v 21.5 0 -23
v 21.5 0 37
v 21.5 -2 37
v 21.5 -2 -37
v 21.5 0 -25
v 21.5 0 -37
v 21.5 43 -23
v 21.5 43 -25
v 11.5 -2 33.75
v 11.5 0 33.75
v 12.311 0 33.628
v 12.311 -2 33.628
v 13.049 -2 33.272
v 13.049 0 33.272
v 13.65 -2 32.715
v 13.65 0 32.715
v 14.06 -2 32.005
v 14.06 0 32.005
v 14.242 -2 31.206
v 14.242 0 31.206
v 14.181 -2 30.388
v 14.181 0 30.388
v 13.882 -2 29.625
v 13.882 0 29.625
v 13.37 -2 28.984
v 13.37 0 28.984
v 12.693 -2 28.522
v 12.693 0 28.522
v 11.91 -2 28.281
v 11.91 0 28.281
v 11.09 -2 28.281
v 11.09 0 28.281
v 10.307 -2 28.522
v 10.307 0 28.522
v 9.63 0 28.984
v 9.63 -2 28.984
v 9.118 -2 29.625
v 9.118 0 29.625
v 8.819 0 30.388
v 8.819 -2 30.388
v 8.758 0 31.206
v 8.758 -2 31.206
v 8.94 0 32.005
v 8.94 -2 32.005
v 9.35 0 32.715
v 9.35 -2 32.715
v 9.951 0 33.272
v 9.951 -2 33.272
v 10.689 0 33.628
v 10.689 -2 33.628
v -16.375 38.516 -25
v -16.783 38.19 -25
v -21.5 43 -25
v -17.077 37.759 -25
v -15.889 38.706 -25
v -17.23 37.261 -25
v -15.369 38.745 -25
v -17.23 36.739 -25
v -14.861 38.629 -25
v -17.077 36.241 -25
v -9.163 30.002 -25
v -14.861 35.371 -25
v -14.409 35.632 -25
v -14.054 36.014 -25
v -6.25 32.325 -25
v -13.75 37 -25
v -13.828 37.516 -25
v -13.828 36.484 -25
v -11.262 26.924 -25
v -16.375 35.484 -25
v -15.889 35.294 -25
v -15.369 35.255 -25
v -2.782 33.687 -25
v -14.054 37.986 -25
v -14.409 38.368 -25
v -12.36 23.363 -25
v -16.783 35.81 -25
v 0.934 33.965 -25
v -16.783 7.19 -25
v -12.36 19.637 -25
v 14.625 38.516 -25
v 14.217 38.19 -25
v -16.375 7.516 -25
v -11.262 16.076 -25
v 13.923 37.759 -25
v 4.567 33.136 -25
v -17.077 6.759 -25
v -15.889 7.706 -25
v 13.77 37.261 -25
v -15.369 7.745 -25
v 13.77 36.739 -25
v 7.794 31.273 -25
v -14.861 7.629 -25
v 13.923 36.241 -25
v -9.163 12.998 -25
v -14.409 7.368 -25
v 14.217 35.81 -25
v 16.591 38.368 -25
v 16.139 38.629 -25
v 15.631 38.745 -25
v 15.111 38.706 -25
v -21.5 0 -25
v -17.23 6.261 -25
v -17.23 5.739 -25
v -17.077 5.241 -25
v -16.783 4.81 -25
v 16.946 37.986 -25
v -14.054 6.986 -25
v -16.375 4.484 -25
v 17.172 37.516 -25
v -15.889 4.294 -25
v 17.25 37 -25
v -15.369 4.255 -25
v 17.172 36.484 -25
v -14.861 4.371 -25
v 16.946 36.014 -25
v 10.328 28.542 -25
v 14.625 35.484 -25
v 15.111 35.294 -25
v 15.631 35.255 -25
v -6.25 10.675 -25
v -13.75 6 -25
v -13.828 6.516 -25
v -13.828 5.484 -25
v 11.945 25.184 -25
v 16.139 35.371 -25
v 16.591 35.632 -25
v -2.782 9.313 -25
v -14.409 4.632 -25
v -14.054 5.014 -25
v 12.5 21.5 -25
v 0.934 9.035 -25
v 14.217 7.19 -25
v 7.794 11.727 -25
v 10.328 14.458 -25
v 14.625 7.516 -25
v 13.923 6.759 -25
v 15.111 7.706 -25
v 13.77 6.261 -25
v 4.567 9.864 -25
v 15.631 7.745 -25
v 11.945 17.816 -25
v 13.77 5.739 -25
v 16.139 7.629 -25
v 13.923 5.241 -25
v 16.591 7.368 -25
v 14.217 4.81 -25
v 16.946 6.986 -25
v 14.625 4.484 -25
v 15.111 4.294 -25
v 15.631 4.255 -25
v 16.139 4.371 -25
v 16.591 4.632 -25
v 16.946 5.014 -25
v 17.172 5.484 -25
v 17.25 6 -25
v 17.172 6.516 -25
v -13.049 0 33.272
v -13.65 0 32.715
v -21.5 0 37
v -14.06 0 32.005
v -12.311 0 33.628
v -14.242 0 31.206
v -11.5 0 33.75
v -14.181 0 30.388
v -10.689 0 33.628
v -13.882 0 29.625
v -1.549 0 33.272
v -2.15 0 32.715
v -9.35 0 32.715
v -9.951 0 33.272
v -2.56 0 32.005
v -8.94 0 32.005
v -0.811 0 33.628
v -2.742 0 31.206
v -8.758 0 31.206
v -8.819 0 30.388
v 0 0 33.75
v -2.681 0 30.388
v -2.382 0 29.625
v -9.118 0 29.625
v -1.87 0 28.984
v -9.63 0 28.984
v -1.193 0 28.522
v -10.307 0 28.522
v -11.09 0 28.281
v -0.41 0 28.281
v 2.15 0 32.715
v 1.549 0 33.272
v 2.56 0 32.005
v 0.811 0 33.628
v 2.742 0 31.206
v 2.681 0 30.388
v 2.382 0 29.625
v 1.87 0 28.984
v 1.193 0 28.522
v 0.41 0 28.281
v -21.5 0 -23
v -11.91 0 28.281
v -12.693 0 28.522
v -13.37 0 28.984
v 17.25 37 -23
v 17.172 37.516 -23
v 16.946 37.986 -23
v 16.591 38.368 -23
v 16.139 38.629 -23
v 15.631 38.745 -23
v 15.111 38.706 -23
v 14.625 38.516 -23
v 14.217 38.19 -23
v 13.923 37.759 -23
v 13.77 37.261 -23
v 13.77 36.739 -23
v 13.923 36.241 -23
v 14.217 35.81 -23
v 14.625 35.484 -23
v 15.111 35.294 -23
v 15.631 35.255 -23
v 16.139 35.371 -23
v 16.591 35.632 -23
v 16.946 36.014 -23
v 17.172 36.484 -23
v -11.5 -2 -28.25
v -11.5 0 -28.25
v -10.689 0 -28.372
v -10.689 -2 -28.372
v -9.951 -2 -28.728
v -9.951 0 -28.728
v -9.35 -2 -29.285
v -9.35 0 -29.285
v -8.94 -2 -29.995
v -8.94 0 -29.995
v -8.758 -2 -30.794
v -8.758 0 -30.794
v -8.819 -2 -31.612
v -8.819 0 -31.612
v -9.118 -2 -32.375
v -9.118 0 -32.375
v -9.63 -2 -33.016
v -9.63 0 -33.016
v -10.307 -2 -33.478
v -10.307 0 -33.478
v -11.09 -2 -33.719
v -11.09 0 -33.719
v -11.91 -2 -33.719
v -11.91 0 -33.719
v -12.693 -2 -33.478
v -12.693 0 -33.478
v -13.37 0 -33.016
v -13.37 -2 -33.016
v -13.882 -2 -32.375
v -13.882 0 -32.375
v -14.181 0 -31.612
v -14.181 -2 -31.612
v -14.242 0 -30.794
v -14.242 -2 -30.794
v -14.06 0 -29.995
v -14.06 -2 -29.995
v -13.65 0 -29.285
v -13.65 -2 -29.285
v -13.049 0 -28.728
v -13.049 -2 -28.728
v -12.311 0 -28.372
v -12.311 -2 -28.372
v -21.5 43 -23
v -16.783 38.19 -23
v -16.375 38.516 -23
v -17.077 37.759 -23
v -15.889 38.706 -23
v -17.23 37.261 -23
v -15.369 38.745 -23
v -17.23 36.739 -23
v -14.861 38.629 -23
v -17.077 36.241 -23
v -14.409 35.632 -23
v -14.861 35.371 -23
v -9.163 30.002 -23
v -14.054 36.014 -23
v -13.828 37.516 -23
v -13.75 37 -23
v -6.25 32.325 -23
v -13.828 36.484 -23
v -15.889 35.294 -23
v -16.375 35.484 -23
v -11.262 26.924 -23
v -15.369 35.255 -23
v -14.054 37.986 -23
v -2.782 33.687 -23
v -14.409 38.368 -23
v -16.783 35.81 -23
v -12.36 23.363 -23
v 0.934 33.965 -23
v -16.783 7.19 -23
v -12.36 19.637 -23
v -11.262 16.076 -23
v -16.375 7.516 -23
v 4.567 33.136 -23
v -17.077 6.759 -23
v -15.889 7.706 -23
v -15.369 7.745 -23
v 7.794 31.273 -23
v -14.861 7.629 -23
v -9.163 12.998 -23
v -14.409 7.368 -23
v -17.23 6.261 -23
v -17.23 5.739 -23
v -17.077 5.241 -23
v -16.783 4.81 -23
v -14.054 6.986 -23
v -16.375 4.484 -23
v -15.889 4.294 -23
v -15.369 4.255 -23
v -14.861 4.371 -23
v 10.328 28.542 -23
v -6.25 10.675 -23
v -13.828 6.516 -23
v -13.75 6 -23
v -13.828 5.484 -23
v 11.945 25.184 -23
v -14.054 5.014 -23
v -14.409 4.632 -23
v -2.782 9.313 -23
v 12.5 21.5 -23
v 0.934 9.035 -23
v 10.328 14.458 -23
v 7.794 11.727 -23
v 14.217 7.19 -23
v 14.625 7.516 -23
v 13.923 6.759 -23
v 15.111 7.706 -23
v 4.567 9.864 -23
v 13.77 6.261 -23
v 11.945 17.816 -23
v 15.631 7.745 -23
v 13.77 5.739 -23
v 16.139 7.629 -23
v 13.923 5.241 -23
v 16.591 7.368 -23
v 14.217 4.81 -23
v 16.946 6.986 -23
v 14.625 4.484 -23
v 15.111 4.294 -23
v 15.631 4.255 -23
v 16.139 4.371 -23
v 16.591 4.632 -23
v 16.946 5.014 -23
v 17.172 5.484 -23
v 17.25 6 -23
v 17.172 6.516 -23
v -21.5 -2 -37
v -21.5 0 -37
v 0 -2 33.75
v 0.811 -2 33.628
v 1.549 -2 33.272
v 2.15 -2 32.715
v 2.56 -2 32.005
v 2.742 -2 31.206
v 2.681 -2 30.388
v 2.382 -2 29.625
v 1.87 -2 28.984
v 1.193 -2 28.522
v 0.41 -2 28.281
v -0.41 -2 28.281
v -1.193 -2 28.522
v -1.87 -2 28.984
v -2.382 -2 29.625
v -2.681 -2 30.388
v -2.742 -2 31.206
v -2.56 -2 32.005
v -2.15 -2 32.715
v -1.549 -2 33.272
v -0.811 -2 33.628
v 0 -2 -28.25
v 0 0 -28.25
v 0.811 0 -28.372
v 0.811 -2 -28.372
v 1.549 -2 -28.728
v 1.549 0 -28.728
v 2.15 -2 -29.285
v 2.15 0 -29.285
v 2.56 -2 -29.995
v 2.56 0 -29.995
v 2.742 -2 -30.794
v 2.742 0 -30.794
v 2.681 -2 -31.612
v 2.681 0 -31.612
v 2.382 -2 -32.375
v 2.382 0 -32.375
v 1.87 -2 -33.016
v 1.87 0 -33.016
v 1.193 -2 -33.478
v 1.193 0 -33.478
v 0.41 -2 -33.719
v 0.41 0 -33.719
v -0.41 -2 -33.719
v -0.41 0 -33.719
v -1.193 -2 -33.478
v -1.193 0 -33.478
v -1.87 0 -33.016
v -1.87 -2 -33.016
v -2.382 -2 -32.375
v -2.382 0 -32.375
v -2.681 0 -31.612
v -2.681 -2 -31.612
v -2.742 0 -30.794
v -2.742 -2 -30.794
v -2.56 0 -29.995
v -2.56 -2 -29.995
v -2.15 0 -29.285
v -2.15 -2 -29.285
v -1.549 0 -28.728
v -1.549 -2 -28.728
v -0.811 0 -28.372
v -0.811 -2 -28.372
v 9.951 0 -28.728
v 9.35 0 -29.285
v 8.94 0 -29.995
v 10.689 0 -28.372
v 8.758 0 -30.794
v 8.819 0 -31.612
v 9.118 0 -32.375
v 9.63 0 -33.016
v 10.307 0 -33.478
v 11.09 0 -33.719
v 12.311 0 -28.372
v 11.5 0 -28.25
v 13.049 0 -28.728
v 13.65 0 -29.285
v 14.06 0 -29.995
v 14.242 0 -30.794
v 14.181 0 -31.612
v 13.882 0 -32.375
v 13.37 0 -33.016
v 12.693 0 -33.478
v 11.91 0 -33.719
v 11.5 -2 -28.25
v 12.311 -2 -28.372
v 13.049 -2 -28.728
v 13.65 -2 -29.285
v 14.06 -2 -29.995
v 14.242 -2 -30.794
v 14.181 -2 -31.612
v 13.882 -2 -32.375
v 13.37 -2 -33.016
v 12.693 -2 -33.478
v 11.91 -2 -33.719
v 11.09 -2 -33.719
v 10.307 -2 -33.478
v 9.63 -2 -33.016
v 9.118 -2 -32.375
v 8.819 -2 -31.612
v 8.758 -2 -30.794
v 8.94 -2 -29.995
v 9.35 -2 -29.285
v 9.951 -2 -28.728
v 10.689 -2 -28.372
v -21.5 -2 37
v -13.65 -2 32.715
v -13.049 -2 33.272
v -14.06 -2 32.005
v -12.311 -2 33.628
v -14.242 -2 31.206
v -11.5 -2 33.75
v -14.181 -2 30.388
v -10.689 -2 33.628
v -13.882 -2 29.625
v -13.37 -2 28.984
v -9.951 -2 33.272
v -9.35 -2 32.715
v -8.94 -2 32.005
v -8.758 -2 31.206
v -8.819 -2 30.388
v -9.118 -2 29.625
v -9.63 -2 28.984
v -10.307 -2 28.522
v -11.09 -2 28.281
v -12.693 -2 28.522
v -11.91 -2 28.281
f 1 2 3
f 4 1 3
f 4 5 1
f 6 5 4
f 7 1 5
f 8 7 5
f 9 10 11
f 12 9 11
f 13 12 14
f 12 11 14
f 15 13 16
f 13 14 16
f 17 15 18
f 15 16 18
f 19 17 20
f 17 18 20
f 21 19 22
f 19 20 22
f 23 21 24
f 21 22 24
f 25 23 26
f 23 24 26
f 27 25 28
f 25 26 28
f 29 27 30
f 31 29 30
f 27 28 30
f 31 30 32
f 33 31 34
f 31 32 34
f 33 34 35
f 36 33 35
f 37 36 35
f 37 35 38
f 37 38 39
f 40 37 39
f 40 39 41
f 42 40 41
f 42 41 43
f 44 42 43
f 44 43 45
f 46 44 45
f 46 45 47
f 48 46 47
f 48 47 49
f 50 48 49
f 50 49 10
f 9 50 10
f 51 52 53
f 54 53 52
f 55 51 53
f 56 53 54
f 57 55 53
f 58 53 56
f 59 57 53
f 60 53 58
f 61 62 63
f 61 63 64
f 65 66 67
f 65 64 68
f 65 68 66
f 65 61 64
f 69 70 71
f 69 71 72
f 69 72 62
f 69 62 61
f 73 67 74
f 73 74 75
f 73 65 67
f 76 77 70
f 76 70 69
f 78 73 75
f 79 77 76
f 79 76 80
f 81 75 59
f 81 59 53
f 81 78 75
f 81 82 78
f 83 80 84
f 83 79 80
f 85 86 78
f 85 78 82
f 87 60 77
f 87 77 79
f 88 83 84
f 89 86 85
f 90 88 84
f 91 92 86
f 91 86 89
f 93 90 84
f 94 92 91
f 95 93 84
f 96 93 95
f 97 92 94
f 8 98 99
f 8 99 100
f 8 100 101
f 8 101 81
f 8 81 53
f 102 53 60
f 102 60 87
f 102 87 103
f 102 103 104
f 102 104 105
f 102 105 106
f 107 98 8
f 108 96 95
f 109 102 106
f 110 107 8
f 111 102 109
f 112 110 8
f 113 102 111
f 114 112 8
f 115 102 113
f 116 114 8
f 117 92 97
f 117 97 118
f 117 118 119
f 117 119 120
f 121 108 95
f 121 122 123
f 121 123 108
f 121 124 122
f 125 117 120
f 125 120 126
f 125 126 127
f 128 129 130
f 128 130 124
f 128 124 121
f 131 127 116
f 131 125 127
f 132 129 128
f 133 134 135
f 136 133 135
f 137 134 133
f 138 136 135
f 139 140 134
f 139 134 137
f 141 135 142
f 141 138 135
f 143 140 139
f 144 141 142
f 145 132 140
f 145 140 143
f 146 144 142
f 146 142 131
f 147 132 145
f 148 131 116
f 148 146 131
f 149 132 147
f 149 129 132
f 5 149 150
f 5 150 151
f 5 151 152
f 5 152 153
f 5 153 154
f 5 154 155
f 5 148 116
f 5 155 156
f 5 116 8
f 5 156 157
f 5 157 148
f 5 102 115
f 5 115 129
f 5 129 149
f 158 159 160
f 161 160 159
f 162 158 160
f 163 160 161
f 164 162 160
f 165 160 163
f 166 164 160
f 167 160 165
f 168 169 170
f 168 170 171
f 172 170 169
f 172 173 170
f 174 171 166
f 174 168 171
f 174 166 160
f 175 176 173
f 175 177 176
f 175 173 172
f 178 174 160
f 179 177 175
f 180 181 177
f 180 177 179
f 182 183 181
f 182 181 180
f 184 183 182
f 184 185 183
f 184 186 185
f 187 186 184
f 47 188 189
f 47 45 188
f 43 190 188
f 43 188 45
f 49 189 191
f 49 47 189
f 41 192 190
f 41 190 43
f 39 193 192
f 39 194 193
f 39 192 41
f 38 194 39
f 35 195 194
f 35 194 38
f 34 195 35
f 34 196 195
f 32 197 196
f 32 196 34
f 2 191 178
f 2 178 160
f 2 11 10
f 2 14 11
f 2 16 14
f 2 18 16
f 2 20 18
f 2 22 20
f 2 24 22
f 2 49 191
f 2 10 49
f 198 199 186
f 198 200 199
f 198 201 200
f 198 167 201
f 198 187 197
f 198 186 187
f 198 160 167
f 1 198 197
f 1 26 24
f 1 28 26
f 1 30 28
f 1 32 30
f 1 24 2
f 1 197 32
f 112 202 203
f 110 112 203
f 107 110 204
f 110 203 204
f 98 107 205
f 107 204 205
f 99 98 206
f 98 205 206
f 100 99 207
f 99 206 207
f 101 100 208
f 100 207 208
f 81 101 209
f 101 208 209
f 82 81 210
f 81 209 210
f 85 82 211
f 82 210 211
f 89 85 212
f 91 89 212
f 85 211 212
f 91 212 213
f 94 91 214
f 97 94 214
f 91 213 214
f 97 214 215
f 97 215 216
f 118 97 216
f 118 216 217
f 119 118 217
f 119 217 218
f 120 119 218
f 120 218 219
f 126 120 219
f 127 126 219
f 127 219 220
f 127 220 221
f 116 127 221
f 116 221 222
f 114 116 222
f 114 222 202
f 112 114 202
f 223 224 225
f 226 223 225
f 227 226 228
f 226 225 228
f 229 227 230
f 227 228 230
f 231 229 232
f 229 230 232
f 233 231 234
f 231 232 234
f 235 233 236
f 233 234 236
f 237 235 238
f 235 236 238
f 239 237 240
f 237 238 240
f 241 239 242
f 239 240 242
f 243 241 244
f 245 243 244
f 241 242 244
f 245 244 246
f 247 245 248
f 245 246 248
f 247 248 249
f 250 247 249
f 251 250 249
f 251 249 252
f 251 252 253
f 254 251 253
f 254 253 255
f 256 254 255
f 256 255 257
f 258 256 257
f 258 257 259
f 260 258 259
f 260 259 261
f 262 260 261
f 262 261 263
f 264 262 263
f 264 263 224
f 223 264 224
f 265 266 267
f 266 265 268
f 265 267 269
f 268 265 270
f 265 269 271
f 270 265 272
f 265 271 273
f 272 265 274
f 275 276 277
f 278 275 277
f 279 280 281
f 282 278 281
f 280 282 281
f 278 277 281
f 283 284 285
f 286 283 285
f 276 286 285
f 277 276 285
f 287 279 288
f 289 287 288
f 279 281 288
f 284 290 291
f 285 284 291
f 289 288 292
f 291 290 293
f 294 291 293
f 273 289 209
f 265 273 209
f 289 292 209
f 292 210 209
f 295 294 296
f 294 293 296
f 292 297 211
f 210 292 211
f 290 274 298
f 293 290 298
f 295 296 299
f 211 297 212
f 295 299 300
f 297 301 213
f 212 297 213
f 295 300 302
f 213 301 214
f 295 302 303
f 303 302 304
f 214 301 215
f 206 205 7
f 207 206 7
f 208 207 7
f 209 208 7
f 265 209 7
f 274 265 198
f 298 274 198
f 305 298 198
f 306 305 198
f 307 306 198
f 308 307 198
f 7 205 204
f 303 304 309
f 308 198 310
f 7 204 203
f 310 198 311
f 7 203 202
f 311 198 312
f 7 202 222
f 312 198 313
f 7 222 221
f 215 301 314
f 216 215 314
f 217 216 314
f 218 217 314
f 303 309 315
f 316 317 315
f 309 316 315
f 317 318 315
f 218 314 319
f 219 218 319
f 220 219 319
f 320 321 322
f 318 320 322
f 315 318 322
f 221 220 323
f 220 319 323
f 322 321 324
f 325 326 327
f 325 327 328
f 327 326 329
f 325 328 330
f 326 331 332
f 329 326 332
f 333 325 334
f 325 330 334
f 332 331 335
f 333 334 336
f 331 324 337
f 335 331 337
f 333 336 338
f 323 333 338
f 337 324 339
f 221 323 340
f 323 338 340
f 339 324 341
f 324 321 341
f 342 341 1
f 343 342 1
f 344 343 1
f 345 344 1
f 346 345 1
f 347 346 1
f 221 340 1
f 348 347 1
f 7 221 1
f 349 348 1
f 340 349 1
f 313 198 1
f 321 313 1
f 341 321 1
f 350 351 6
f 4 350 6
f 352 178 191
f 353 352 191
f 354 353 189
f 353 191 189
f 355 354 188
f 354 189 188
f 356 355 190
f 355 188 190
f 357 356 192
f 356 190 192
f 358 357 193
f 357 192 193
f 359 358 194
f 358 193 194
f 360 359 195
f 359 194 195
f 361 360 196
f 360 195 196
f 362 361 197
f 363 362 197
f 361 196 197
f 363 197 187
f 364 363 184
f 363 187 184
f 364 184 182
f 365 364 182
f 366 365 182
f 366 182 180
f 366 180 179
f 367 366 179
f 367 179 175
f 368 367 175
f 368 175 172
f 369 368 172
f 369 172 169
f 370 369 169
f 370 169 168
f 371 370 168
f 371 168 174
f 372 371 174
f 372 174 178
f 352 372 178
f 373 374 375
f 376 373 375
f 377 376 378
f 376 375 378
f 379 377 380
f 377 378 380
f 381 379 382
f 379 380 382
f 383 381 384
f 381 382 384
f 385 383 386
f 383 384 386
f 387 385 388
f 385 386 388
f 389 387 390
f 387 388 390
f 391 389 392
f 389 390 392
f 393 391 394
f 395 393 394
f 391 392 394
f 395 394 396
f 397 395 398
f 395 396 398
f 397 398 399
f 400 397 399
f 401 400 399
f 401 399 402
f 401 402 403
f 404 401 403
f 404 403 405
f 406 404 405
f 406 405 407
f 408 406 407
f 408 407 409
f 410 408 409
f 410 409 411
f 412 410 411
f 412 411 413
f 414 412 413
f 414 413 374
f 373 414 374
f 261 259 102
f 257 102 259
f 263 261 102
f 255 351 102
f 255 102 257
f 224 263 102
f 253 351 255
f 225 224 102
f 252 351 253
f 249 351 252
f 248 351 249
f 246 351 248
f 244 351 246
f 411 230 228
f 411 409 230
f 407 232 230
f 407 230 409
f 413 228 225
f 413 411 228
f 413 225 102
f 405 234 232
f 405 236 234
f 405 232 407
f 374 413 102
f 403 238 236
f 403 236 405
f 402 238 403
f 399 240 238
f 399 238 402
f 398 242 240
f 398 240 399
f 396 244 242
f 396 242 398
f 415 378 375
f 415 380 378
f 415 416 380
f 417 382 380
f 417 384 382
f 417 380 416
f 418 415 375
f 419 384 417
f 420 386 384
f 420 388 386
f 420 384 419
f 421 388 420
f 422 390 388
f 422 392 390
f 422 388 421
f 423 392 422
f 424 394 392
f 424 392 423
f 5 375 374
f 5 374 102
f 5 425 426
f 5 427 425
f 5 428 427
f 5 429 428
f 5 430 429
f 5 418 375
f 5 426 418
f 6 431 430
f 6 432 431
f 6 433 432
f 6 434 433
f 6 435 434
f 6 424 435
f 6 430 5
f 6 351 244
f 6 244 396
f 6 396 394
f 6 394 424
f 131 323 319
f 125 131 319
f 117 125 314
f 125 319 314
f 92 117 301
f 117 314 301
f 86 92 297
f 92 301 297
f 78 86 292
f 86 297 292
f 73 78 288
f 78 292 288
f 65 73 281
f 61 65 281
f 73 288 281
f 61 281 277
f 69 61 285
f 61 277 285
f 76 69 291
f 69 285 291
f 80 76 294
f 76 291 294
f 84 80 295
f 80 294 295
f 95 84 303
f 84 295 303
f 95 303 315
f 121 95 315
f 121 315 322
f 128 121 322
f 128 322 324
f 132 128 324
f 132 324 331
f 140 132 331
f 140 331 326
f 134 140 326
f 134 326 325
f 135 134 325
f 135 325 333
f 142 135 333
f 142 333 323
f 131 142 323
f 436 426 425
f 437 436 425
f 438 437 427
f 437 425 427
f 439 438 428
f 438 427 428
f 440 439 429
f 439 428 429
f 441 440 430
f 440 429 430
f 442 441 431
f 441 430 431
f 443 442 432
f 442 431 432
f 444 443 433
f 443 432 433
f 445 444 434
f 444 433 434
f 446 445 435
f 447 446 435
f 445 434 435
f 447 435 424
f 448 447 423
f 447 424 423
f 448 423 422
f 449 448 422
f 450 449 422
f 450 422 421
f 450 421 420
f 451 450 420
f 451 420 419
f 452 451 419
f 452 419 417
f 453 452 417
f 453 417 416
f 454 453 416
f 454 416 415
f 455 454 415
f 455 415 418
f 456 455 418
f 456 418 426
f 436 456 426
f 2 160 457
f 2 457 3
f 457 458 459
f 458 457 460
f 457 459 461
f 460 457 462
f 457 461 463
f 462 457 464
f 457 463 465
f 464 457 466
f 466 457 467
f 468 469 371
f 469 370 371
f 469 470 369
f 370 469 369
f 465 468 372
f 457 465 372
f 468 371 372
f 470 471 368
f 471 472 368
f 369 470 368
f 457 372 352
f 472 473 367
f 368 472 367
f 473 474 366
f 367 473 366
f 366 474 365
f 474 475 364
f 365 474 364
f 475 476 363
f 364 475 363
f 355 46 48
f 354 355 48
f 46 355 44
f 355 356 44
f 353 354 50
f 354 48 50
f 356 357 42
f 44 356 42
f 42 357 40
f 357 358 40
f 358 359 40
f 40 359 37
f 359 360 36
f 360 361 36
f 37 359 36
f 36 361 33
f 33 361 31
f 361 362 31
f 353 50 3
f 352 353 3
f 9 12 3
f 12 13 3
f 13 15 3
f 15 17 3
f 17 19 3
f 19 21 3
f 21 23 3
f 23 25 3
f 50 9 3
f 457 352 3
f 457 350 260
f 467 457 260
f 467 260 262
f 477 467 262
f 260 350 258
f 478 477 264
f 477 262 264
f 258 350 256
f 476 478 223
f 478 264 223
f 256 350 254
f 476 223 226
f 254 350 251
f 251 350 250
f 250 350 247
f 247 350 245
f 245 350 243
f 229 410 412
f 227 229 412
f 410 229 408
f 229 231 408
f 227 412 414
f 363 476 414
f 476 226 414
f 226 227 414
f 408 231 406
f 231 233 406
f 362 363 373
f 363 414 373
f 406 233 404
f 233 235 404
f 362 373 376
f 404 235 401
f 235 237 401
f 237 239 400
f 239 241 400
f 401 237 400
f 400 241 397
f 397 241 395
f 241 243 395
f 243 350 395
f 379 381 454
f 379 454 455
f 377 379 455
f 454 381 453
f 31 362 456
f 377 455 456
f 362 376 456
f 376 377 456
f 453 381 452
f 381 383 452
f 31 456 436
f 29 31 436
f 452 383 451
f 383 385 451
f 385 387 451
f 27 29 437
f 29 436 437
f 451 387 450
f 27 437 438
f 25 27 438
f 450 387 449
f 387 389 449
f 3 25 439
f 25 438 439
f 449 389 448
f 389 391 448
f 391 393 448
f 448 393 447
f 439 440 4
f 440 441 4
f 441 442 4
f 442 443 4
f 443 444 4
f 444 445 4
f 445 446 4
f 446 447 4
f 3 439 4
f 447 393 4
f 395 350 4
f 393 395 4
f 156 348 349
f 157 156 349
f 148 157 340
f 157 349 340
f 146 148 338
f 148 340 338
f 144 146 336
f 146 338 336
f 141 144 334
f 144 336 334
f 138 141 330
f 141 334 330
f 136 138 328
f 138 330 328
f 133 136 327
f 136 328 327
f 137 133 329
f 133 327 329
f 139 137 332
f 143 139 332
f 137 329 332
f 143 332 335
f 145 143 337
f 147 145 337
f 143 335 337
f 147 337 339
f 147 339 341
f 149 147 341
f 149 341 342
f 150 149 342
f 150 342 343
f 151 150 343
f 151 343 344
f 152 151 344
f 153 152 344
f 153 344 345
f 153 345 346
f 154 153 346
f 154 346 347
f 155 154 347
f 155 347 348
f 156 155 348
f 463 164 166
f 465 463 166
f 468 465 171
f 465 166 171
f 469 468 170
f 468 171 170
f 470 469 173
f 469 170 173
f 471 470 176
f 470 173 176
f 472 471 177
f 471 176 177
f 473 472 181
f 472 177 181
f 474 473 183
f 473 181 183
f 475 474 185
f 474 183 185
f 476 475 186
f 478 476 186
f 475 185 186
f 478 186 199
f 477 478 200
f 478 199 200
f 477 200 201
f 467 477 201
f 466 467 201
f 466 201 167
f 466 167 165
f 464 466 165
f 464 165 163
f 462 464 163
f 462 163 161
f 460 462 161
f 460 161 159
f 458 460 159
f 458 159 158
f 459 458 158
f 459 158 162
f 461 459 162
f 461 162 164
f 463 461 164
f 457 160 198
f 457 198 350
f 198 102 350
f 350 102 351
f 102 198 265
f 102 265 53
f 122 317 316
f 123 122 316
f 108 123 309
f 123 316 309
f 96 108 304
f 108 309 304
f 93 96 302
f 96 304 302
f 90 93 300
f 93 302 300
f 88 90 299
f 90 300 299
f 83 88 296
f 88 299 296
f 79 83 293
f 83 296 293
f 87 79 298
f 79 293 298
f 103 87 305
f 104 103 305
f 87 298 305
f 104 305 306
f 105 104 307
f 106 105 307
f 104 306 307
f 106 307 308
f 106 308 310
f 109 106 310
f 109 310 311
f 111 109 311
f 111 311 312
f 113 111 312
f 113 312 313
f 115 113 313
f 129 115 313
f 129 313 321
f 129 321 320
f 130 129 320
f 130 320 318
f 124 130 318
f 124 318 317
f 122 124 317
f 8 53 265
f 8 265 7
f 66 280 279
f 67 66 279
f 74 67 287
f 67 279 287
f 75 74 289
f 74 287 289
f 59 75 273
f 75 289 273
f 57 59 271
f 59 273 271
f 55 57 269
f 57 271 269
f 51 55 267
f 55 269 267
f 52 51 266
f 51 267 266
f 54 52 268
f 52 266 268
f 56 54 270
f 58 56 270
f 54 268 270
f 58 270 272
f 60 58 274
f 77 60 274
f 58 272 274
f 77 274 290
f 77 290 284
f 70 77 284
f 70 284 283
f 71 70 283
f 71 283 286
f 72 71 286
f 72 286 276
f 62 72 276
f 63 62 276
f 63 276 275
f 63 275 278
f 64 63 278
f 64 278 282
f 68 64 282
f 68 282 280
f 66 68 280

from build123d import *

# Parameters (mm, degrees)
SKETCH1_W           = 43
SKETCH1_H           = 2
BOSS_EXTRUDE1_DEPTH = 43
SKETCH1_3_W         = 43
SKETCH1_3_H         = 74
BOSS_EXTRUDE2_DEPTH = 2
CUT_EXTRUDE1_REACH  = 78.885
SKETCH2_R           = 12.5
SKETCH2_R_2         = 1.75
CUT_EXTRUDE2_REACH  = 62.665
SKETCH1_4_R         = 2.75
LPATTERN1_COUNT     = 2
LPATTERN1_PITCH     = 11.5
LPATTERN1_COL_COUNT = 2
LPATTERN1_COL_PITCH = 11.5


with BuildPart() as part:
    # Sketch1 → Boss-Extrude1 (new body)
    with BuildSketch(Plane(origin=(0, 0, 0), x_dir=(1, 0, 0), z_dir=(0, 1, 0))):
        with Locations((0, 24)):
            Rectangle(SKETCH1_W, SKETCH1_H)
    extrude(amount=BOSS_EXTRUDE1_DEPTH)

    # Sketch1<3> → Boss-Extrude2 (add)
    with BuildSketch(Plane(origin=(0, 0, 0), x_dir=(1, 0, 0), z_dir=(0, 1, 0))):
        Rectangle(SKETCH1_3_W, SKETCH1_3_H)
    extrude(amount=-BOSS_EXTRUDE2_DEPTH)

    # Sketch2 → Cut-Extrude1 (cut, up to next)
    with BuildSketch(Plane.XY.offset(-23), mode=Mode.PRIVATE) as cut_extrude1_sk1:
        with Locations((0, 21.5)):
            Circle(SKETCH2_R)
    cut_extrude1_tool1 = extrude(cut_extrude1_sk1.sketch, amount=-CUT_EXTRUDE1_REACH, mode=Mode.PRIVATE) & part.part
    # Sketch2 → Cut-Extrude1 (cut, up to next)
    with BuildSketch(Plane.XY.offset(-23), mode=Mode.PRIVATE) as cut_extrude1_sk2:
        with Locations((-15.5, 37)):
            Circle(SKETCH2_R_2)
    cut_extrude1_tool2 = extrude(cut_extrude1_sk2.sketch, amount=-CUT_EXTRUDE1_REACH, mode=Mode.PRIVATE) & part.part
    # Sketch2 → Cut-Extrude1 (cut, up to next)
    with BuildSketch(Plane.XY.offset(-23), mode=Mode.PRIVATE) as cut_extrude1_sk3:
        with Locations((15.5, 37)):
            Circle(SKETCH2_R_2)
    cut_extrude1_tool3 = extrude(cut_extrude1_sk3.sketch, amount=-CUT_EXTRUDE1_REACH, mode=Mode.PRIVATE) & part.part
    # Sketch2 → Cut-Extrude1 (cut, up to next)
    with BuildSketch(Plane.XY.offset(-23), mode=Mode.PRIVATE) as cut_extrude1_sk4:
        with Locations((15.5, 6)):
            Circle(SKETCH2_R_2)
    cut_extrude1_tool4 = extrude(cut_extrude1_sk4.sketch, amount=-CUT_EXTRUDE1_REACH, mode=Mode.PRIVATE) & part.part
    # Sketch2 → Cut-Extrude1 (cut, up to next)
    with BuildSketch(Plane.XY.offset(-23), mode=Mode.PRIVATE) as cut_extrude1_sk5:
        with Locations((-15.5, 6)):
            Circle(SKETCH2_R_2)
    cut_extrude1_tool5 = extrude(cut_extrude1_sk5.sketch, amount=-CUT_EXTRUDE1_REACH, mode=Mode.PRIVATE) & part.part
    add(cut_extrude1_tool1.solids().sort_by_distance((0, 21.5, -23))[0], mode=Mode.SUBTRACT)
    add(cut_extrude1_tool2.solids().sort_by_distance((-15.5, 37, -23))[0], mode=Mode.SUBTRACT)
    add(cut_extrude1_tool3.solids().sort_by_distance((15.5, 37, -23))[0], mode=Mode.SUBTRACT)
    add(cut_extrude1_tool4.solids().sort_by_distance((15.5, 6, -23))[0], mode=Mode.SUBTRACT)
    add(cut_extrude1_tool5.solids().sort_by_distance((-15.5, 6, -23))[0], mode=Mode.SUBTRACT)

    # Sketch1<4> → Cut-Extrude2 (cut, up to next)
    with BuildSketch(Plane(origin=(0, 0, 0), x_dir=(1, 0, 0), z_dir=(0, 1, 0)), mode=Mode.PRIVATE) as cut_extrude2_sk1:
        with Locations((0, 31)):
            Circle(SKETCH1_4_R)
    cut_extrude2_tool1 = extrude(cut_extrude2_sk1.sketch, amount=-CUT_EXTRUDE2_REACH, mode=Mode.PRIVATE) & part.part
    # Sketch1<4> → Cut-Extrude2 (cut, up to next)
    with BuildSketch(Plane(origin=(0, 0, 0), x_dir=(1, 0, 0), z_dir=(0, 1, 0)), mode=Mode.PRIVATE) as cut_extrude2_sk2:
        with Locations((0, -31)):
            Circle(SKETCH1_4_R)
    cut_extrude2_tool2 = extrude(cut_extrude2_sk2.sketch, amount=-CUT_EXTRUDE2_REACH, mode=Mode.PRIVATE) & part.part
    cut_extrude2_1 = cut_extrude2_tool1.solids().sort_by_distance((0, 0, -31))[0]
    add(cut_extrude2_1, mode=Mode.SUBTRACT)
    cut_extrude2_2 = cut_extrude2_tool2.solids().sort_by_distance((0, 0, 31))[0]
    add(cut_extrude2_2, mode=Mode.SUBTRACT)
    cut_extrude2 = cut_extrude2_1 + cut_extrude2_2  # Cut-Extrude2 as one shape, for the pattern or mirror that repeats it

    # LPattern1: Cut-Extrude2 ×2
    with Locations(*[(i * LPATTERN1_PITCH, 0, 0) for i in range(1, LPATTERN1_COUNT)]):
        add(cut_extrude2, mode=Mode.SUBTRACT)

    # LPattern1 col: Cut-Extrude2 ×2
    with Locations(*[(-i * LPATTERN1_COL_PITCH, 0, 0) for i in range(1, LPATTERN1_COL_COUNT)]):
        add(cut_extrude2, mode=Mode.SUBTRACT)


solid = part.part
